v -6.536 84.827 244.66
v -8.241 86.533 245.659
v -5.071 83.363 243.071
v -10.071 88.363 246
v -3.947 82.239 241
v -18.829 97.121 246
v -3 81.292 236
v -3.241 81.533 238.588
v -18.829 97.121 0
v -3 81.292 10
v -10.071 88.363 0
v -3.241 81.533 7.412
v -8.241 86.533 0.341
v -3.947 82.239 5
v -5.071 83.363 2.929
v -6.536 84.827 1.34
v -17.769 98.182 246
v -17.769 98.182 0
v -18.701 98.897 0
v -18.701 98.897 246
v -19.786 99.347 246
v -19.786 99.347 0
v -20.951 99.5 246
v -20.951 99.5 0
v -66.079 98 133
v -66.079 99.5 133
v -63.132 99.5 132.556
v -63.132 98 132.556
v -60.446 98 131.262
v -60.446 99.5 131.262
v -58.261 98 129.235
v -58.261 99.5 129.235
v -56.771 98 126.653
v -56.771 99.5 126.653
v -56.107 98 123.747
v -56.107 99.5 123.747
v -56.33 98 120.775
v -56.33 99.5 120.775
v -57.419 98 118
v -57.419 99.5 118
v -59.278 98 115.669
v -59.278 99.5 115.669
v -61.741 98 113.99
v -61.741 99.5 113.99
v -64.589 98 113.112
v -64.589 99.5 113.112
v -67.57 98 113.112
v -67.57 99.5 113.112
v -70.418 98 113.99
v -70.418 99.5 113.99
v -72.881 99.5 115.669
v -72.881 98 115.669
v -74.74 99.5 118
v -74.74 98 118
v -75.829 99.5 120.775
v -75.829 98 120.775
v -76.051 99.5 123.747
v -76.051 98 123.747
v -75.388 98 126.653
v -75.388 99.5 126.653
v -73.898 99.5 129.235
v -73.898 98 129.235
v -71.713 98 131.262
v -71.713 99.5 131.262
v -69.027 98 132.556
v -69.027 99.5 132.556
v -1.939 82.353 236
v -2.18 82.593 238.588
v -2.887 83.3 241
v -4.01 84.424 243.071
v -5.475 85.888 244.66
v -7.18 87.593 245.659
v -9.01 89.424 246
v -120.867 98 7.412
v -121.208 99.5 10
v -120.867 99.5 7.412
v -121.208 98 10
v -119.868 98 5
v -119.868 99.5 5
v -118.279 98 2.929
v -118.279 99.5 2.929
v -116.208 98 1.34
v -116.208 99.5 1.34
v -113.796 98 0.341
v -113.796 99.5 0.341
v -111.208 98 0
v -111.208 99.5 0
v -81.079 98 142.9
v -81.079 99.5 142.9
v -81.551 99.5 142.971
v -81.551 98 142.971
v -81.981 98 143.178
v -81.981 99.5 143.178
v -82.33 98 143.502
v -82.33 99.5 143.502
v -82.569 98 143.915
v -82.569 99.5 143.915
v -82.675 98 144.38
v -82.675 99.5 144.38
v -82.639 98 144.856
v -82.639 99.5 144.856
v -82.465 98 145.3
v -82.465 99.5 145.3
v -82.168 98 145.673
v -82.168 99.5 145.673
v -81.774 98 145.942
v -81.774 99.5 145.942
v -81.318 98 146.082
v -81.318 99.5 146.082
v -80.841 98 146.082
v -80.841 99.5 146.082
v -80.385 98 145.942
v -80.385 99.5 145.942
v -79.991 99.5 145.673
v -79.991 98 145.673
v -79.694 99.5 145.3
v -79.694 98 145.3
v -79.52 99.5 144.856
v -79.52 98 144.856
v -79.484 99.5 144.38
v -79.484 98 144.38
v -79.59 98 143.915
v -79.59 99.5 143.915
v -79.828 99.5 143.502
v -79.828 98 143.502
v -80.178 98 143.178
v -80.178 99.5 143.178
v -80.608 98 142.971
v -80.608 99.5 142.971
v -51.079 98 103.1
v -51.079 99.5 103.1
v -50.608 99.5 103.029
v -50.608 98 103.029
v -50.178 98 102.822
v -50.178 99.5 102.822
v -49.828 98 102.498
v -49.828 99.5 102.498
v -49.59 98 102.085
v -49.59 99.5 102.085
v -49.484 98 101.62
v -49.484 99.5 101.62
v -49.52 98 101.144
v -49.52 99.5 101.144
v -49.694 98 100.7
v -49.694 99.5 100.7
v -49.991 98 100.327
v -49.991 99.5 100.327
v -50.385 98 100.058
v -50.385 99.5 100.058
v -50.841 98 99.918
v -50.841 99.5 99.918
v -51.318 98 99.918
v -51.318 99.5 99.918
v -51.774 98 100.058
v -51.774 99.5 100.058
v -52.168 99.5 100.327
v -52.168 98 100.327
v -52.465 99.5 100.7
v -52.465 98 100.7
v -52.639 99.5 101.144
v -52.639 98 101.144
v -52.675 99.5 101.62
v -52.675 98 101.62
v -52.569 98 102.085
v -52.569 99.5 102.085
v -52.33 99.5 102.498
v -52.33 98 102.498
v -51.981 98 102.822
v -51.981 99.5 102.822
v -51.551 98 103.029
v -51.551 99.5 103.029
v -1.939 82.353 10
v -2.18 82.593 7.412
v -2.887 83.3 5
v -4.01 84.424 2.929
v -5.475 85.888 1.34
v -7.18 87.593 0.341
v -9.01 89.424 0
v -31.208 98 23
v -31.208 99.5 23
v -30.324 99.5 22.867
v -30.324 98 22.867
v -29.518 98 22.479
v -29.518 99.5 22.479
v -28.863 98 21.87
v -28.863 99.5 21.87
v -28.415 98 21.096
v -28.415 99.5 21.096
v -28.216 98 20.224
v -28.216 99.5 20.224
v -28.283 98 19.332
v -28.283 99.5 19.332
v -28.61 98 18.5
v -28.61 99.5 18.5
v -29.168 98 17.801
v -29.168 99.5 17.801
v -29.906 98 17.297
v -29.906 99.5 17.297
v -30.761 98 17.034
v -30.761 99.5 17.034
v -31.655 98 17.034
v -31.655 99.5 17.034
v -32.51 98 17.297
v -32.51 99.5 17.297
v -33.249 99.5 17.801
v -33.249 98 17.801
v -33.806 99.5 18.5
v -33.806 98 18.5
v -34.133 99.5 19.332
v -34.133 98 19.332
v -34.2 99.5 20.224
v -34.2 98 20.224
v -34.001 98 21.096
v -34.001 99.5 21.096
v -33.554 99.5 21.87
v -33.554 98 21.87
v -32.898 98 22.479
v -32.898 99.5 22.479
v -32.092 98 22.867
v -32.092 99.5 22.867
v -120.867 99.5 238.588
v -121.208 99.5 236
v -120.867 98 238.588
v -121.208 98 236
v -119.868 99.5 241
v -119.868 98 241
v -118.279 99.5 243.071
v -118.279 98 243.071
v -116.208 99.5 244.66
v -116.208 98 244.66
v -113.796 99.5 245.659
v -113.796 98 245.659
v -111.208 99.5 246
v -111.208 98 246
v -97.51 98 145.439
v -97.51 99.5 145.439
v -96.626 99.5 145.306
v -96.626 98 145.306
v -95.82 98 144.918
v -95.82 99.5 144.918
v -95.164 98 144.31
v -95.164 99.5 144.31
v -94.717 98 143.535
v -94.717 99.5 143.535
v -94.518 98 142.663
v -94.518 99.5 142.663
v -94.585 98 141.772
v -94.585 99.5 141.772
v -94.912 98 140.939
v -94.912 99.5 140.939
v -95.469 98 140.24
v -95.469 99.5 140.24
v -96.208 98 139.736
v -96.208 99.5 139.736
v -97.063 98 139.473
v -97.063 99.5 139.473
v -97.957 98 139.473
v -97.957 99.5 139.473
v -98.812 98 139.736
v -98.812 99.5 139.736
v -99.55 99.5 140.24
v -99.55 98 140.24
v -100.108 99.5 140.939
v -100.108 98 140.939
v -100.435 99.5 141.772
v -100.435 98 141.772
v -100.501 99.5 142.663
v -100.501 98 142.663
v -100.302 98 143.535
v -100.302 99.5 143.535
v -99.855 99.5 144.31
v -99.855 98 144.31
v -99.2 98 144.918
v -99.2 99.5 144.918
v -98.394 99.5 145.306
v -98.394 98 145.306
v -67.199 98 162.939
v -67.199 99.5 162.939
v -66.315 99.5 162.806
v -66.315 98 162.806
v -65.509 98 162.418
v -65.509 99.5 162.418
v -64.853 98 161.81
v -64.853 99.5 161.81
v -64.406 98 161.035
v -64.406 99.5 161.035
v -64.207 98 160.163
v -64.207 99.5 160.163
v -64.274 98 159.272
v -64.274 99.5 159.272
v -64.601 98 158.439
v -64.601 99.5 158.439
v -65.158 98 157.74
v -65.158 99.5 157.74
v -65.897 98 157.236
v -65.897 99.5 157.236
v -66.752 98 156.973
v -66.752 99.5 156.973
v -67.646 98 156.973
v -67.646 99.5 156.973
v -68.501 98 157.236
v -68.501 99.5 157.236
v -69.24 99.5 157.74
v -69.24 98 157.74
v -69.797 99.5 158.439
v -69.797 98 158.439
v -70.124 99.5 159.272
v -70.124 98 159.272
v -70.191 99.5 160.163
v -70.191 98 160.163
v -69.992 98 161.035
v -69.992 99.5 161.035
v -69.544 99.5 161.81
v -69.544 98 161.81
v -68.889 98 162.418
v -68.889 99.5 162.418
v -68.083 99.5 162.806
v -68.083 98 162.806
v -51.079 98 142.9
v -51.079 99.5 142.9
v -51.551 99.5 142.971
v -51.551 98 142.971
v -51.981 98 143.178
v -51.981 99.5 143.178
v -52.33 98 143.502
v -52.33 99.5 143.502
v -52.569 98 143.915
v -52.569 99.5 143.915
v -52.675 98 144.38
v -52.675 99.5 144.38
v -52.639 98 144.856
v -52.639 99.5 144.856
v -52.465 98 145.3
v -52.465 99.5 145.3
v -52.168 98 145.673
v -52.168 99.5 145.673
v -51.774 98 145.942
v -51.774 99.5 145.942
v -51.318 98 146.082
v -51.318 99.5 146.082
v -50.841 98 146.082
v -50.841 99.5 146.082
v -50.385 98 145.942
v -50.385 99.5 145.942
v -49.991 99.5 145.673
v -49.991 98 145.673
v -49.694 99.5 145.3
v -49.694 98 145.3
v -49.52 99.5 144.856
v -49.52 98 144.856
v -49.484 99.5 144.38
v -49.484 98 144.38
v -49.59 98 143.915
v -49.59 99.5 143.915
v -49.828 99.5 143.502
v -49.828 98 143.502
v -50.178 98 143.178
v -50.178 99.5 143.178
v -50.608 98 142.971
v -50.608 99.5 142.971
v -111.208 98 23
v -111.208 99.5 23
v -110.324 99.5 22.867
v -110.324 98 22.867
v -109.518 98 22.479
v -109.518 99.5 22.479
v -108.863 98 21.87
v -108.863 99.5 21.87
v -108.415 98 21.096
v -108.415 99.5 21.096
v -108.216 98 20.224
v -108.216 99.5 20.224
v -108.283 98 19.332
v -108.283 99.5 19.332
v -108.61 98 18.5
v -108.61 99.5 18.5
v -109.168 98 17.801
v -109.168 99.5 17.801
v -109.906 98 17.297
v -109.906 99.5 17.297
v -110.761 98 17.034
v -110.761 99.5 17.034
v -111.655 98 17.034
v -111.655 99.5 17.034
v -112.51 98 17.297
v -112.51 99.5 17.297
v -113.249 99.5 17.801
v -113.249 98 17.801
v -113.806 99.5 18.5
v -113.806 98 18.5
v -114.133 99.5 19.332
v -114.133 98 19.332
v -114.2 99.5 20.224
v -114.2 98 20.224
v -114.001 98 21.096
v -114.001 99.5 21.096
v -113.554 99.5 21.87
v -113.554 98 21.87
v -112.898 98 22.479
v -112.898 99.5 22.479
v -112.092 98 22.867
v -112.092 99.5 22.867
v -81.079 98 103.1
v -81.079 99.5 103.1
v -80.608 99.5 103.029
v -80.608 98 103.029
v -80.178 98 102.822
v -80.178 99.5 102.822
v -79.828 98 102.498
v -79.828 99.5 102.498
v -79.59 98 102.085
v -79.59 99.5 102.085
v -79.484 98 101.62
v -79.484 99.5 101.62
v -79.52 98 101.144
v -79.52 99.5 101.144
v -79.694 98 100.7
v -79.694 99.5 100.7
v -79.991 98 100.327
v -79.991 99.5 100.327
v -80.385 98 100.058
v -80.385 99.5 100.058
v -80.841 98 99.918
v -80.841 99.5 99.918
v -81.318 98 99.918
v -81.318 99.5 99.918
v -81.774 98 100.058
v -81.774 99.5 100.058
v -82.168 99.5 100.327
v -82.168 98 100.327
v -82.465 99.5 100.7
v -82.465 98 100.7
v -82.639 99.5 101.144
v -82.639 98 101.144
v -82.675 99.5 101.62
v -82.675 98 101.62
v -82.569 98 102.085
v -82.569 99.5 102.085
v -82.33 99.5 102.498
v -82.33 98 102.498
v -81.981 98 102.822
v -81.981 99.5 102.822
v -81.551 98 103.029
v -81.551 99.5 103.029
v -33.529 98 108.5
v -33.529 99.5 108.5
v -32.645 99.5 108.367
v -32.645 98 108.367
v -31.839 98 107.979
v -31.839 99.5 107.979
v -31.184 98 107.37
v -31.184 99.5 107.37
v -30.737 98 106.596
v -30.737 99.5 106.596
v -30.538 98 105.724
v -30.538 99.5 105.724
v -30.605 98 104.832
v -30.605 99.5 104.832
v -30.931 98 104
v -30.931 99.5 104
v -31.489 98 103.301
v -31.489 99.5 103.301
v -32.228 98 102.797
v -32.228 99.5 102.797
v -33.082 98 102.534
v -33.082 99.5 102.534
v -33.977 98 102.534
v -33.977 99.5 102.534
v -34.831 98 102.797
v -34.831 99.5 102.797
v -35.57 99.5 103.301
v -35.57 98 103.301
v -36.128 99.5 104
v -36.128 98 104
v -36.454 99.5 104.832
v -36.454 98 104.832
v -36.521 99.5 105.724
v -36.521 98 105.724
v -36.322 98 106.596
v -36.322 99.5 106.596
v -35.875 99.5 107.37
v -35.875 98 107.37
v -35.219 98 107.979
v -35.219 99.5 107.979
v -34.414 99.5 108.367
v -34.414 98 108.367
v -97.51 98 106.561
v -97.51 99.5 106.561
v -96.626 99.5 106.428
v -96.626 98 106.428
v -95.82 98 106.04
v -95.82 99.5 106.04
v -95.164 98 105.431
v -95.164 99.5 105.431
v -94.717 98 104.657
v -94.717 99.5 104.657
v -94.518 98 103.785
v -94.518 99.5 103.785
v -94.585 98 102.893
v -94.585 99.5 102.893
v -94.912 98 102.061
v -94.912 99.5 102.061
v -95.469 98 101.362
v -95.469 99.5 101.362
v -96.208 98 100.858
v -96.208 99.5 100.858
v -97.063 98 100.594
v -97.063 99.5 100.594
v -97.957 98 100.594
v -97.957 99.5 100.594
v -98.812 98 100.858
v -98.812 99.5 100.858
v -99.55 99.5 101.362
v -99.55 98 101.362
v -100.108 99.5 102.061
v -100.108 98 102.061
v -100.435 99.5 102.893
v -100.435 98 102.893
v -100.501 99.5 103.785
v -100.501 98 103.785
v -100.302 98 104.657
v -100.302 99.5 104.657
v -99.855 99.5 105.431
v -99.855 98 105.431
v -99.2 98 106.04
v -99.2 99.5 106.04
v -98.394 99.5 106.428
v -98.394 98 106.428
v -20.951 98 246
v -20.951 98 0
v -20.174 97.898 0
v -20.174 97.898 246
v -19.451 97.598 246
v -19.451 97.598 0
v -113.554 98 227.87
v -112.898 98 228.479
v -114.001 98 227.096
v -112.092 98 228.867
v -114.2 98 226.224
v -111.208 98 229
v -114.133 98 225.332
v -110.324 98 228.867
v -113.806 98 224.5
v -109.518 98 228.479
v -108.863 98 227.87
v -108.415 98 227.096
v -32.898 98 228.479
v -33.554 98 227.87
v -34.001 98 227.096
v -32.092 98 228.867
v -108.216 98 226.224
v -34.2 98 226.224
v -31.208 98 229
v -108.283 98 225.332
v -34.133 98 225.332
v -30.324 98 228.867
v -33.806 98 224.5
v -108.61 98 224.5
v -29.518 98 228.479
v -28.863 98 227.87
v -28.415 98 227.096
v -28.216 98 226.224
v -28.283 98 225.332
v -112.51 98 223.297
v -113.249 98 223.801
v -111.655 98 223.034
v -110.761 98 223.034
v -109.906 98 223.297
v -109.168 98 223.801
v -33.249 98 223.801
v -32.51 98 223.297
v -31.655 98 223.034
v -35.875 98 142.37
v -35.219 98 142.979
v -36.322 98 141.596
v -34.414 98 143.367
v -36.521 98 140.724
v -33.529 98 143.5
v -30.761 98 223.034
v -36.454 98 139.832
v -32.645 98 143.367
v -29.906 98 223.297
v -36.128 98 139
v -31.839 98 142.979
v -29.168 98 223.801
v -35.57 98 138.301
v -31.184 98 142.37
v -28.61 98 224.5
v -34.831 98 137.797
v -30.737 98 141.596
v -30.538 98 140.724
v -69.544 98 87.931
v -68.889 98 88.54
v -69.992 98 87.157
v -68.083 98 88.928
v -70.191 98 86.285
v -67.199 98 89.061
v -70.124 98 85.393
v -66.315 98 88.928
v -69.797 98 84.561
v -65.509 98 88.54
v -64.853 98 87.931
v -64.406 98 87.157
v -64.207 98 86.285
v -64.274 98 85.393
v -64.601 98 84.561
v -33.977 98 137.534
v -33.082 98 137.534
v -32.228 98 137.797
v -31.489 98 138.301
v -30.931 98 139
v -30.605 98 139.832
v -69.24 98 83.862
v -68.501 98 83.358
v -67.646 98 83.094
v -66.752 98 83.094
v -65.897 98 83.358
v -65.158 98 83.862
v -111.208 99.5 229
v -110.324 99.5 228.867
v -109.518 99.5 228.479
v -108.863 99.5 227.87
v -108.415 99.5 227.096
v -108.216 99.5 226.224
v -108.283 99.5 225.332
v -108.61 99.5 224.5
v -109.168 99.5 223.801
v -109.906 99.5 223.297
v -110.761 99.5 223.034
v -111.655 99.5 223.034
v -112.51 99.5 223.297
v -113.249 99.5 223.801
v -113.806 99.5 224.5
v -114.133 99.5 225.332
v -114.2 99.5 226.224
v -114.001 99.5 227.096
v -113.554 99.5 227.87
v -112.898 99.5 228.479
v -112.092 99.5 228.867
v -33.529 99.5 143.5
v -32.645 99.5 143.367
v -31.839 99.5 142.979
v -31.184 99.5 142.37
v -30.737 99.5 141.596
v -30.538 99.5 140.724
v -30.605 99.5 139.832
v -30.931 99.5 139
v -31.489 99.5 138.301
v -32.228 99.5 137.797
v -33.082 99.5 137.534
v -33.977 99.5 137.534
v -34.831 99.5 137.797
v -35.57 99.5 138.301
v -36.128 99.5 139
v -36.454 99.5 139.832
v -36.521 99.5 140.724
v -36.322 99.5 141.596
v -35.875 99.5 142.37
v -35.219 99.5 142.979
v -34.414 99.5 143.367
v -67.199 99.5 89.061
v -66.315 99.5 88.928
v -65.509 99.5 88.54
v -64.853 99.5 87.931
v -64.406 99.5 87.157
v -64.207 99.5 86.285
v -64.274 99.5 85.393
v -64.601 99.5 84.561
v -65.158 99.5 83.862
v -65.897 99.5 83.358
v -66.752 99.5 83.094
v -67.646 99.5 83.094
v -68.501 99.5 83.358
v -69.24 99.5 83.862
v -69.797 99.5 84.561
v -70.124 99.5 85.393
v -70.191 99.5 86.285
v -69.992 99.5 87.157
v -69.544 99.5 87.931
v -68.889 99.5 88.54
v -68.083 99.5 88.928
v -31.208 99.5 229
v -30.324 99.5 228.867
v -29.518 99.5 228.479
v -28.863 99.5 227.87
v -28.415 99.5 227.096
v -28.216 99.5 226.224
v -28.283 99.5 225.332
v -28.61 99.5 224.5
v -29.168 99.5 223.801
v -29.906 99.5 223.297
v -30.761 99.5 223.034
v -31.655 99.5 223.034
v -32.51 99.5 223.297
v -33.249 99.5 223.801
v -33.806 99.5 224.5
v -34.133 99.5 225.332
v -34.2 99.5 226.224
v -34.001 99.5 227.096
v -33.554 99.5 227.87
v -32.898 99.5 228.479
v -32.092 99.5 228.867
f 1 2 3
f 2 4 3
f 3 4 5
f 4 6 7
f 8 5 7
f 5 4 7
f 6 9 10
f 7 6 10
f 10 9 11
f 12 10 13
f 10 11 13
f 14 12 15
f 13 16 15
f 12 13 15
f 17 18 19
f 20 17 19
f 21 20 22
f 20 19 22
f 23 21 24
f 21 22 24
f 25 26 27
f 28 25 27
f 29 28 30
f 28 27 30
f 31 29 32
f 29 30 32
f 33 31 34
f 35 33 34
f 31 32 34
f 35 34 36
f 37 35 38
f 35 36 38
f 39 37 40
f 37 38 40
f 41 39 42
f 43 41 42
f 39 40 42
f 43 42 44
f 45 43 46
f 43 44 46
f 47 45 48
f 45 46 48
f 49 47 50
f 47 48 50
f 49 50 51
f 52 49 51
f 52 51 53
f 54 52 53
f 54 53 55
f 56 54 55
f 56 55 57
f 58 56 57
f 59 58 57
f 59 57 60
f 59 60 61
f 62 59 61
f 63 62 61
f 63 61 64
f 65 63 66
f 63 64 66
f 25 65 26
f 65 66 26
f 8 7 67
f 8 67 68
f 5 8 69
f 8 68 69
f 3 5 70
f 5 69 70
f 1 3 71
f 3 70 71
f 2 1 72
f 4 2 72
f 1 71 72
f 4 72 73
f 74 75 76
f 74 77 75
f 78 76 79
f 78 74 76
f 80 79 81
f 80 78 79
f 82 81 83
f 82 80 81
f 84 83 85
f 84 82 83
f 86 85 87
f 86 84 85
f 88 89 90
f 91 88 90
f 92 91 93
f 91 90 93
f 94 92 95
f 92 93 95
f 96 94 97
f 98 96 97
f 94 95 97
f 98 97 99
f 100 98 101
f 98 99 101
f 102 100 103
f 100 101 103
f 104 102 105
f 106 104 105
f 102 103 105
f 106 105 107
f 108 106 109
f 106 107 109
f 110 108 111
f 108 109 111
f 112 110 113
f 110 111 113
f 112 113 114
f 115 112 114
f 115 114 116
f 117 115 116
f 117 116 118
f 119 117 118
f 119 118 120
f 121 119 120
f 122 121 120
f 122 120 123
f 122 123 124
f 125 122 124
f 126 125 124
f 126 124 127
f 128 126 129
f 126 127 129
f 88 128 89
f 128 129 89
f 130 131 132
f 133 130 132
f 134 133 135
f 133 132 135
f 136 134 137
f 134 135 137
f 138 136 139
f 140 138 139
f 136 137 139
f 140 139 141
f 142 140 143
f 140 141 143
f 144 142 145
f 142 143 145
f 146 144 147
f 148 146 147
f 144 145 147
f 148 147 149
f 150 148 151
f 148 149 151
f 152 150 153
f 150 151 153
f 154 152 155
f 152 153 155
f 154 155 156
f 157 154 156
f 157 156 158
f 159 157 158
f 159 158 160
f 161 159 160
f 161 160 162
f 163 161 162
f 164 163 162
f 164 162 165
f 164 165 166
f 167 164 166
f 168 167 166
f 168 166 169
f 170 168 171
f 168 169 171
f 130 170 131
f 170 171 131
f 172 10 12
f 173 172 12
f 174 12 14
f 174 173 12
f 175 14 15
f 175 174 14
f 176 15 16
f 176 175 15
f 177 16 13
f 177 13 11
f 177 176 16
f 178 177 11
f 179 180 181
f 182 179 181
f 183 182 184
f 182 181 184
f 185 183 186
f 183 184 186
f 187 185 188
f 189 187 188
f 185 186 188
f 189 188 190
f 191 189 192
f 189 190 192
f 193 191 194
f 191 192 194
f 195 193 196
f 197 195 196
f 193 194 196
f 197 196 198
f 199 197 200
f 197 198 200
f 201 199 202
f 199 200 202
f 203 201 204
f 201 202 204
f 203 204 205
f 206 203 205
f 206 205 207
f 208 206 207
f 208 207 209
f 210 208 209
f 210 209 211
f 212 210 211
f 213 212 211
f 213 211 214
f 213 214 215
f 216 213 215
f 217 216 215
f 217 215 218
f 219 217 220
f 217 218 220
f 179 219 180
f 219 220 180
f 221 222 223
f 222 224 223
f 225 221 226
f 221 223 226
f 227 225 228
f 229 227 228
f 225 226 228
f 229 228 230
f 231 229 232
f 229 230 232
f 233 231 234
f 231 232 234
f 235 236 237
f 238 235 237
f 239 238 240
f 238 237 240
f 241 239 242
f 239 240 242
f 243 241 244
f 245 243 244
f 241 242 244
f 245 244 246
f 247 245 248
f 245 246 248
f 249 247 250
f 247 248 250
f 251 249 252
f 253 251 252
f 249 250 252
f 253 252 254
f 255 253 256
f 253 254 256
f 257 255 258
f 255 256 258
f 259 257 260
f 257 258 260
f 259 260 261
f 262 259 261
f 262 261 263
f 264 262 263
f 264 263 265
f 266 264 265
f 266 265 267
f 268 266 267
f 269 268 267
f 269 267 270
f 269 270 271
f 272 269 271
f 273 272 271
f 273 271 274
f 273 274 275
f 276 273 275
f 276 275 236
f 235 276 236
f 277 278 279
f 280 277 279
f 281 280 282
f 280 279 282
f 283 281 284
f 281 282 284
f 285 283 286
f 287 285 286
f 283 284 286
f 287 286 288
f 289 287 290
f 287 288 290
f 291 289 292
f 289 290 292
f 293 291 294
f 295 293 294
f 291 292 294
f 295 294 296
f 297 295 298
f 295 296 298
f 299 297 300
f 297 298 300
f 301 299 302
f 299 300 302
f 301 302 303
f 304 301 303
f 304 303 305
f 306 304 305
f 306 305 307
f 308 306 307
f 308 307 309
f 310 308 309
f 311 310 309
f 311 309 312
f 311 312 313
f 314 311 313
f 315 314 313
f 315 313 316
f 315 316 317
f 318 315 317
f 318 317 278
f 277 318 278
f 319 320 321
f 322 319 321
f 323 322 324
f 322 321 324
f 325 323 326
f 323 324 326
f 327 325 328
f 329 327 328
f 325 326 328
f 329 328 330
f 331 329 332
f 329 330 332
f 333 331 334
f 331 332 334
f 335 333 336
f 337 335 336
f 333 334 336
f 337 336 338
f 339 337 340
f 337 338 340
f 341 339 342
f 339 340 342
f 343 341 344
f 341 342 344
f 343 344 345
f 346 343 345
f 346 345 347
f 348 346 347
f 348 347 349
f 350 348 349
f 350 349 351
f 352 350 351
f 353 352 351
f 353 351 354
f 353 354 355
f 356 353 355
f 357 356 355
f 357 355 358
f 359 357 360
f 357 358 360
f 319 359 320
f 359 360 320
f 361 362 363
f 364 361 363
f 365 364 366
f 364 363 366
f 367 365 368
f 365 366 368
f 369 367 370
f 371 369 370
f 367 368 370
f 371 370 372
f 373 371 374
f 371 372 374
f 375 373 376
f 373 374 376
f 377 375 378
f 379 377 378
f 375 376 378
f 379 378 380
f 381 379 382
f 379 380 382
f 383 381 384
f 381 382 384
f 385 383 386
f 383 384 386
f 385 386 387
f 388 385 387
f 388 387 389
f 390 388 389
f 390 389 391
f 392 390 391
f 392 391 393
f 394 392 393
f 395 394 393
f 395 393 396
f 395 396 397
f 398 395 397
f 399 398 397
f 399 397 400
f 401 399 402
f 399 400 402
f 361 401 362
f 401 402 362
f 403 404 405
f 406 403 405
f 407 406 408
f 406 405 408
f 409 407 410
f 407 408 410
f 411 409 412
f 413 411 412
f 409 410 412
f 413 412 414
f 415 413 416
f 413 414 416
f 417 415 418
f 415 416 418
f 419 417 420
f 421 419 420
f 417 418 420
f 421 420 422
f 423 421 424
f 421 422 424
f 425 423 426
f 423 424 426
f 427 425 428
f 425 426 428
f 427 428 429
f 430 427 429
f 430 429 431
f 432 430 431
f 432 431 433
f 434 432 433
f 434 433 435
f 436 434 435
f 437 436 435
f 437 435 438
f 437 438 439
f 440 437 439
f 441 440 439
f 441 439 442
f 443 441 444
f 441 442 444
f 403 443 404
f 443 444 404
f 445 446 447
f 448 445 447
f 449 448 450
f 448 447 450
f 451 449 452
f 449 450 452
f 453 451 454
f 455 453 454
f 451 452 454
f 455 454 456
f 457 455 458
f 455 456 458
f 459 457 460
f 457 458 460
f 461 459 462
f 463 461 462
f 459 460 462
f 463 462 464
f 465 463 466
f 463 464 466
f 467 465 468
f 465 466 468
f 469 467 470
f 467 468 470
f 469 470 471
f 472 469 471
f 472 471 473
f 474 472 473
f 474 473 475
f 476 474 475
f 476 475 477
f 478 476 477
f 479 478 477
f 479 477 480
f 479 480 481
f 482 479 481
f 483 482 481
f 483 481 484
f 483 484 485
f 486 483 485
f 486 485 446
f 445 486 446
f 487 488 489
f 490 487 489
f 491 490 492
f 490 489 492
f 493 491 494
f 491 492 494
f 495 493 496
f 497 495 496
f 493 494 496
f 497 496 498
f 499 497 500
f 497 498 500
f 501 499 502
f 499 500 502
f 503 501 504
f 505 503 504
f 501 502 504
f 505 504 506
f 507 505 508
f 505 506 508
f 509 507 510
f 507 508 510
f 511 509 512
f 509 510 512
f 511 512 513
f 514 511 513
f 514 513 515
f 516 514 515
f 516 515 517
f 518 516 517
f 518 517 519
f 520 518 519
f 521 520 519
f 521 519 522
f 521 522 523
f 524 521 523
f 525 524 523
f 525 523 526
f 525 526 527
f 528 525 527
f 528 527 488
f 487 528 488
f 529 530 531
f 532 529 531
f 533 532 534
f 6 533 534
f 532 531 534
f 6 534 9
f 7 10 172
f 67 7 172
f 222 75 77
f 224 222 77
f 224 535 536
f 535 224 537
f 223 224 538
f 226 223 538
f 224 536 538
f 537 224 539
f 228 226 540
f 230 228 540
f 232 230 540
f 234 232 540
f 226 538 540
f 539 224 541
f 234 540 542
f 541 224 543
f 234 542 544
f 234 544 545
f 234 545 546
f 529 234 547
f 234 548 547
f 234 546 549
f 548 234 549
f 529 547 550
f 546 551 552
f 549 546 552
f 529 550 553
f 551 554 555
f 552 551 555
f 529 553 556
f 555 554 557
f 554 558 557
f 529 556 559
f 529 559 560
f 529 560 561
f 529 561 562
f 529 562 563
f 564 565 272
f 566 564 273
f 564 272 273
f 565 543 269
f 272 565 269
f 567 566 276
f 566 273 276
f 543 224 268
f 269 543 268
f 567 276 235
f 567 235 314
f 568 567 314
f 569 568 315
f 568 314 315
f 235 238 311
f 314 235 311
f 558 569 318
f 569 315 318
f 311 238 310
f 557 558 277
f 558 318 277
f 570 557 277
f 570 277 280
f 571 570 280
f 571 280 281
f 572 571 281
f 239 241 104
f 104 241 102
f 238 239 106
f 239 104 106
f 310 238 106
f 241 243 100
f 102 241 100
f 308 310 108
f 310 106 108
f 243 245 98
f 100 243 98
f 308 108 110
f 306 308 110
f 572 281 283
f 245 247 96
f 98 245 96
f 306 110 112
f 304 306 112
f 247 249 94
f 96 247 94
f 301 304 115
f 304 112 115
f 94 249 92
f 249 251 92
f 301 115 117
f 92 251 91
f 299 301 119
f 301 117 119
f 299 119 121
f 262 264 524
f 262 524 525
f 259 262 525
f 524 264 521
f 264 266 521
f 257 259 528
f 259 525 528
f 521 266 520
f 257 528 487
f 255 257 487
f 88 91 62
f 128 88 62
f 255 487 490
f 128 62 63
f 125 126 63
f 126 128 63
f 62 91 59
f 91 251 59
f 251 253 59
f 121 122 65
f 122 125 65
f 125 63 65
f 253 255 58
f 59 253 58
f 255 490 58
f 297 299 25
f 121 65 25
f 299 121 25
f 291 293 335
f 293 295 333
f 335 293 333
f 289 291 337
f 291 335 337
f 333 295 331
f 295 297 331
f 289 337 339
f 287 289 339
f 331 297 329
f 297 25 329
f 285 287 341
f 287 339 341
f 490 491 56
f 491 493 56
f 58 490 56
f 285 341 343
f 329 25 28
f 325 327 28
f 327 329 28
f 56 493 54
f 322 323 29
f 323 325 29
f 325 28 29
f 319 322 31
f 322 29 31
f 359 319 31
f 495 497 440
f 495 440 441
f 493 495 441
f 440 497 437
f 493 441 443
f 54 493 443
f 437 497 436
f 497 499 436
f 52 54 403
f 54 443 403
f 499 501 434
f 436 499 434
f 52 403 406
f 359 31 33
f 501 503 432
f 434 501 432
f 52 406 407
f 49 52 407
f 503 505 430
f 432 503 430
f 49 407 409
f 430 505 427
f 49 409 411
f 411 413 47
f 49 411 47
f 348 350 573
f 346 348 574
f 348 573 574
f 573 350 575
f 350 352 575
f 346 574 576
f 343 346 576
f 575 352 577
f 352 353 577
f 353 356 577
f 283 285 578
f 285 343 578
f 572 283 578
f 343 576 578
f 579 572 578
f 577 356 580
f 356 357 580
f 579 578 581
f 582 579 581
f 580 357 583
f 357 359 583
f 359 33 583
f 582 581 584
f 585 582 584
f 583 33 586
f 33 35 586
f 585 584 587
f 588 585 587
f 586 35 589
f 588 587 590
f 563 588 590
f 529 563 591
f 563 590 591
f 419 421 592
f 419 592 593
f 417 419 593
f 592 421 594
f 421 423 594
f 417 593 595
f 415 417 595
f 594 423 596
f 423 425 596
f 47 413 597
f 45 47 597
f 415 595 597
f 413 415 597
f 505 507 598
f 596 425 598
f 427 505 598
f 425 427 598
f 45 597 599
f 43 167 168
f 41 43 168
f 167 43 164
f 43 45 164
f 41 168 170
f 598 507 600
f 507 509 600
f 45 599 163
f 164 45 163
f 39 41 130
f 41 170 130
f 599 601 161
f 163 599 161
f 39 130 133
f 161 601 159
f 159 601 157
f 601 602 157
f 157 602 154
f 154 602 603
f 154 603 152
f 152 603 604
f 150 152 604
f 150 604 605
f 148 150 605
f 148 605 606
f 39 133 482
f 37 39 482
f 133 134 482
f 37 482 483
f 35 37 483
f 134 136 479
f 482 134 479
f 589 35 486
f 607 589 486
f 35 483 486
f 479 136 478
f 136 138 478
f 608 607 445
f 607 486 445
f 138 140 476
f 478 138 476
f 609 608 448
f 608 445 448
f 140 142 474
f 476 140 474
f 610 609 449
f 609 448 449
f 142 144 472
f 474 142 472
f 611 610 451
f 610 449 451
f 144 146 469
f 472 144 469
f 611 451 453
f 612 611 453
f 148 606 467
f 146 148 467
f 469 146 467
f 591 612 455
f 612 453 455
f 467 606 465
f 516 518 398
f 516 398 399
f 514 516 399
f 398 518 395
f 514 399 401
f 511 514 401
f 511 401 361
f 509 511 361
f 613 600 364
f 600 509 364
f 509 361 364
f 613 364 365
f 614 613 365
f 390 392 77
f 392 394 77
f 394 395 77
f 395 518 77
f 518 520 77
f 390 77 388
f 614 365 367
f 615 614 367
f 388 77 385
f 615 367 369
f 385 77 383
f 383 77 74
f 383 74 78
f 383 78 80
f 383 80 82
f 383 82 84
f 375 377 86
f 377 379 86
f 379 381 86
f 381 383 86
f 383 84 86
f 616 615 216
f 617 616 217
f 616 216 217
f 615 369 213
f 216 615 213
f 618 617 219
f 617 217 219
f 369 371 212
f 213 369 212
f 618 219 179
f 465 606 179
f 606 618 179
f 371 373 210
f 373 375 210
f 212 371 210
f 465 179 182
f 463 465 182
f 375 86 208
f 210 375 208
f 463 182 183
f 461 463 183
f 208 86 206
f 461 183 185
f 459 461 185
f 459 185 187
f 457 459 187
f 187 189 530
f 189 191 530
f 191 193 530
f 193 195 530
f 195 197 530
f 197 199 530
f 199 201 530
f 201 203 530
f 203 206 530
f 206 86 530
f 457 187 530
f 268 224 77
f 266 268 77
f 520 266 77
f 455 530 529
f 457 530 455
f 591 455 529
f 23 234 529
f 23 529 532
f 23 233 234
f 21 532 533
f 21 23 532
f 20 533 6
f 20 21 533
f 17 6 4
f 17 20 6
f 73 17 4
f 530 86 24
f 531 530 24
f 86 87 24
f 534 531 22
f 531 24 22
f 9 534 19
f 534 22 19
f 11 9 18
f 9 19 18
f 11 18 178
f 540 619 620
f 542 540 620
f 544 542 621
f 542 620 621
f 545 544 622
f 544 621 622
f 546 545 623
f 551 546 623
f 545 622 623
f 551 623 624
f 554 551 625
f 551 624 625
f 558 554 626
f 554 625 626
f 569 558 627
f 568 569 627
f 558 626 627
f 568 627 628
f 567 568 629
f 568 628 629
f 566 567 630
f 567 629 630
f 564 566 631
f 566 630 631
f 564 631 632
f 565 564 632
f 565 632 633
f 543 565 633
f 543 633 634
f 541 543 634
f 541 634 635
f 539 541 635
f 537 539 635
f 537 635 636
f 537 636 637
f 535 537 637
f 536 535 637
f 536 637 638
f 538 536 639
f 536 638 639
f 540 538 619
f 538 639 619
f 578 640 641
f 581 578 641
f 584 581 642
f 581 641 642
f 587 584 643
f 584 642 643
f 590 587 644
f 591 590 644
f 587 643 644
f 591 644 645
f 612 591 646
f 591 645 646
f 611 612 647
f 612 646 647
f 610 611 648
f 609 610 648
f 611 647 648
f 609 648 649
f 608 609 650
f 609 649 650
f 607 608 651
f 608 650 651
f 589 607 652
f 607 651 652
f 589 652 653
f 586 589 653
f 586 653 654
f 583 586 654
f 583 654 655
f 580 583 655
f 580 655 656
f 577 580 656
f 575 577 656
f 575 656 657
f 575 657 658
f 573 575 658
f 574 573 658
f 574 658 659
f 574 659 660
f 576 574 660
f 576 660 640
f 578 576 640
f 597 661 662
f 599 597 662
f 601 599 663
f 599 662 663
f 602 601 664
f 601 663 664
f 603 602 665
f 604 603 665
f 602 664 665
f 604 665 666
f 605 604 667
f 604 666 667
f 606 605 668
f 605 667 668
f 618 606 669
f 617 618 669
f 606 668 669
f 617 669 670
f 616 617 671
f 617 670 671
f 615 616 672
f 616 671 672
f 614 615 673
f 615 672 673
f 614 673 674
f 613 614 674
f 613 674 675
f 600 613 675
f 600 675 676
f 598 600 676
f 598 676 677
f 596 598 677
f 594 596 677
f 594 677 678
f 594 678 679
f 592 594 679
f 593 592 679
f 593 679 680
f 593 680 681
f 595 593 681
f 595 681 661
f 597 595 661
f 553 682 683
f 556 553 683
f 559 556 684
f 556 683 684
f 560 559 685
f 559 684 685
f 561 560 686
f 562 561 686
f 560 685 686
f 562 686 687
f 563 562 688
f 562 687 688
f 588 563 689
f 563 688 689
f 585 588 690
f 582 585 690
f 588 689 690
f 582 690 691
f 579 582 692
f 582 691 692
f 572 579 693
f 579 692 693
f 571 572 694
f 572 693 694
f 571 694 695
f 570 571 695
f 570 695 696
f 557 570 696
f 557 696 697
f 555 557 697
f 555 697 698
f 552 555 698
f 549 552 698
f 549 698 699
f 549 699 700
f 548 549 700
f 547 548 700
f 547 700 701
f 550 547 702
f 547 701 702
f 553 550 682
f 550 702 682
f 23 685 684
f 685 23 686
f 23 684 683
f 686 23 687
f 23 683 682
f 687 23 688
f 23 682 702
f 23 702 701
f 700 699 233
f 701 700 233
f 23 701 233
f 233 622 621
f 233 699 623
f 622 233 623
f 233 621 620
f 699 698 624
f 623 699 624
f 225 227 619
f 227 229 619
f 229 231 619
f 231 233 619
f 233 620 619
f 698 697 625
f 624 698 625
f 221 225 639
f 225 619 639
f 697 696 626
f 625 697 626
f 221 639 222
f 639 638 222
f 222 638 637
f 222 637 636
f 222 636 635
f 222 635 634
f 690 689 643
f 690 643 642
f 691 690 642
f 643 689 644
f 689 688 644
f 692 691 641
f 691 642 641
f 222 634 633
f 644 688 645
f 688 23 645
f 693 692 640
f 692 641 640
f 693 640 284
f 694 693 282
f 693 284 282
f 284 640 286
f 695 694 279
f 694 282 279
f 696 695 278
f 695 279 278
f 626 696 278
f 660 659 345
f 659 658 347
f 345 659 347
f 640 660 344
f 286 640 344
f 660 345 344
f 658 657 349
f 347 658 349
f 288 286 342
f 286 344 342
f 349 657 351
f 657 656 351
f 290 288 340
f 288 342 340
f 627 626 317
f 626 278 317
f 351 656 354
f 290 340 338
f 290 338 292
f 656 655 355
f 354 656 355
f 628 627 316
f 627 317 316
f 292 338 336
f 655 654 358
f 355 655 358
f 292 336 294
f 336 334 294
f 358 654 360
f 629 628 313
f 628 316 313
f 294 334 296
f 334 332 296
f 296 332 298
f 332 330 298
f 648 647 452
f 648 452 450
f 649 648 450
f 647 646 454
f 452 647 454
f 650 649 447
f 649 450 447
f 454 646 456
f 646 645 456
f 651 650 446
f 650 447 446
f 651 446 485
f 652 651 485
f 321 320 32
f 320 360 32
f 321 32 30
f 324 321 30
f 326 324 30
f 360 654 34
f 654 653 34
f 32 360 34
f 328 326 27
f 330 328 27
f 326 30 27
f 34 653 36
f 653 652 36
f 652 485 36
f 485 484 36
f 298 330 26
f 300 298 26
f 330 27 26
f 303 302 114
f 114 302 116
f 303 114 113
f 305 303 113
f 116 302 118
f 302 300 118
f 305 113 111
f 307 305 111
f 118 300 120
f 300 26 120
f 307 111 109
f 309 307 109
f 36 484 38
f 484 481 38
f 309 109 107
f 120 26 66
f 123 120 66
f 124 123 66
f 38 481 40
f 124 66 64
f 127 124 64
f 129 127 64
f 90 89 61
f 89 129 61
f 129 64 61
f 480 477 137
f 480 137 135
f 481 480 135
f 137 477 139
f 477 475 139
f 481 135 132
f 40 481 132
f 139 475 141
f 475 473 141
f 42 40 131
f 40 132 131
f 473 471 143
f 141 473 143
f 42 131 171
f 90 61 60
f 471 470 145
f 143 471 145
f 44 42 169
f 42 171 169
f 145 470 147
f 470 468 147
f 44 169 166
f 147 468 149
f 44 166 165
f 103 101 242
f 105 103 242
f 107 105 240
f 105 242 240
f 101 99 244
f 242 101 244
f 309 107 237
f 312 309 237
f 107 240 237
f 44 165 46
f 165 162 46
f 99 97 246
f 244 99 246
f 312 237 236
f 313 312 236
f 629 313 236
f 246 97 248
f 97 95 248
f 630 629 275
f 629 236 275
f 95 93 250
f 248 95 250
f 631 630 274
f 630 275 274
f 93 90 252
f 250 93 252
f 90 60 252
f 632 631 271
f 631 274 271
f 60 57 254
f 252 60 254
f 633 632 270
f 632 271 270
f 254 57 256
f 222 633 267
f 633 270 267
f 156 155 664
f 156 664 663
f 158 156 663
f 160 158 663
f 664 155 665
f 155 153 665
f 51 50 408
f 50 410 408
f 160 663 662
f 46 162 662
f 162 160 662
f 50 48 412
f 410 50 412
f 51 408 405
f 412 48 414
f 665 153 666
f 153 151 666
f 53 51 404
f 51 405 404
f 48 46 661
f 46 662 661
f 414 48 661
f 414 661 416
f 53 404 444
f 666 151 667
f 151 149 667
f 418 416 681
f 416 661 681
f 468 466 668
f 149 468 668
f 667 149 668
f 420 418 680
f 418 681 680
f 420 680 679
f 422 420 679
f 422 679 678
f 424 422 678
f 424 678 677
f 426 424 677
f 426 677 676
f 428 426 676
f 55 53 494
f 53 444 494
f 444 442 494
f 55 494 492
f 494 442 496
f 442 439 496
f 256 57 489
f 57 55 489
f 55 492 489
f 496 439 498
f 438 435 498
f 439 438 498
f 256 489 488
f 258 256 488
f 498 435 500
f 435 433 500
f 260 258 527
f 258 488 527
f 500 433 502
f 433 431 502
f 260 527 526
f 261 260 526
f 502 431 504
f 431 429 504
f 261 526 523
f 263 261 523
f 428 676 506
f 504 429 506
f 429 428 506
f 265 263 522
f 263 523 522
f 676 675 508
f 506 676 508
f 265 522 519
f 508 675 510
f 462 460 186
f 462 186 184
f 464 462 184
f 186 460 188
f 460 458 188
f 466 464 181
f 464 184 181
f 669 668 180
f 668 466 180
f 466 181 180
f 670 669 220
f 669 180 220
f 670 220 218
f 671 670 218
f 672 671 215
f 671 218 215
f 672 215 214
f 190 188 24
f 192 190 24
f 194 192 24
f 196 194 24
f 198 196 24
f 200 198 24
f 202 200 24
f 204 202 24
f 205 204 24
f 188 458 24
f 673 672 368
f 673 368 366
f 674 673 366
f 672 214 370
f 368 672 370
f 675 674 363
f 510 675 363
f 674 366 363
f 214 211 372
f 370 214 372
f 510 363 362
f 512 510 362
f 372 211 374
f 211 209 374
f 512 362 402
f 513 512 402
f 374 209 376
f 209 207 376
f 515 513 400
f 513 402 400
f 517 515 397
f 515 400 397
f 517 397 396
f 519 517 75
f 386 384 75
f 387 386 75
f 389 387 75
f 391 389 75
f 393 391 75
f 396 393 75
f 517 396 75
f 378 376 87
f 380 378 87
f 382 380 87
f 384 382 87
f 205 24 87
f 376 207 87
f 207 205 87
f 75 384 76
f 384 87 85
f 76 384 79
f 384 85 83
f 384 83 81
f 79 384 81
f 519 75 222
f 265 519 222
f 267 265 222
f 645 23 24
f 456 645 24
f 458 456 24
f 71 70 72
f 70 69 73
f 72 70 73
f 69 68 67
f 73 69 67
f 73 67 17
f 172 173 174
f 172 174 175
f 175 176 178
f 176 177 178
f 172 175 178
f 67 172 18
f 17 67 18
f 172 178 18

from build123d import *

# Parameters (mm, degrees)
BASE_FLANGE1_DEPTH = 246
FILLET1_R          = 10
SKETCH7_R          = 3
CUT_EXTRUDE1_DEPTH = 1.5
SKETCH8_R          = 10
SKETCH8_R_2        = 1.6
CUT_EXTRUDE2_DEPTH = 1.5
SKETCH9_R          = 3
CUT_EXTRUDE3_DEPTH = 10


# Sheet-metal steps are written as plain solids
with BuildPart() as part:
    # Sketch1 → Base-Flange1 (new body)
    with BuildSketch(Plane.XY):
        with BuildLine():
            Line((-121.208107966, 98), (-20.950748653, 98))
            ThreePointArc((-20.950748653, 98), (-19.802698356, 97.771638598), (-18.829428309, 97.121320344))
            Line((-18.829428309, 97.121320344), (-3, 81.291892034))
            Line((-3, 81.291892034), (-1.939339828, 82.352552206))
            Line((-1.939339828, 82.352552206), (-17.768768137, 98.181980515))
            ThreePointArc((-17.768768137, 98.181980515), (-19.228673207, 99.157457896), (-20.950748653, 99.5))
            Line((-20.950748653, 99.5), (-121.208107966, 99.5))
            Line((-121.208107966, 99.5), (-121.208107966, 98))
        make_face()
    extrude(amount=BASE_FLANGE1_DEPTH)

    # Fillet1
    fillet1_edges = [part.edges().sort_by_distance(p)[0] for p in [
        (-121.208107966, 98.75, 246),
        (-121.208107966, 98.75, 0),
        (-2.469669914, 81.82222212, 246),
        (-2.469669914, 81.82222212, 0),
    ]]
    fillet(fillet1_edges, radius=FILLET1_R)

    # Sketch7 → Cut-Extrude1 (cut)
    with BuildSketch(Plane(origin=(0, 99.5, 0), x_dir=(1, 0, 0), z_dir=(0, 1, 0))):
        with Locations(Location((-111.208107966, -20, 0), (0, 0, 270))):
            Circle(SKETCH7_R)
        with Locations(Location((-31.208107966, -20, 0), (0, 0, 270))):
            Circle(SKETCH7_R)
        with Locations(Location((-31.208107966, -226, 0), (0, 0, 270))):
            Circle(SKETCH7_R)
        with Locations(Location((-111.208107966, -226, 0), (0, 0, 270))):
            Circle(SKETCH7_R)
    extrude(amount=-CUT_EXTRUDE1_DEPTH, mode=Mode.SUBTRACT)

    # Sketch8 → Cut-Extrude2 (cut)
    with BuildSketch(Plane(origin=(0, 99.5, 0), x_dir=(1, 0, 0), z_dir=(0, 1, 0))):
        with Locations(Location((-66.079428309, -123, 0), (0, 0, 270))):
            Circle(SKETCH8_R)
        with Locations(Location((-51.079428309, -101.5, 0), (0, 0, 270))):
            Circle(SKETCH8_R_2)
        with Locations(Location((-81.079428309, -101.5, 0), (0, 0, 270))):
            Circle(SKETCH8_R_2)
        with Locations(Location((-81.079428309, -144.5, 0), (0, 0, 90))):
            Circle(SKETCH8_R_2)
        with Locations(Location((-51.079428309, -144.5, 0), (0, 0, 90))):
            Circle(SKETCH8_R_2)
    extrude(amount=-CUT_EXTRUDE2_DEPTH, mode=Mode.SUBTRACT)

    # Sketch9 → Cut-Extrude3 (cut)
    with BuildSketch(Plane(origin=(0, 99.5, 0), x_dir=(1, 0, 0), z_dir=(0, 1, 0))):
        with Locations(Location((-33.529428309, -105.5, 0), (0, 0, 270))):
            Circle(SKETCH9_R)
        with Locations(Location((-33.529428309, -140.5, 0), (0, 0, 270))):
            Circle(SKETCH9_R)
        with Locations(Location((-67.198983743, -159.939126893, 0), (0, 0, 270))):
            Circle(SKETCH9_R)
        with Locations(Location((-97.509872875, -142.439126893, 0), (0, 0, 270))):
            Circle(SKETCH9_R)
        with Locations(Location((-97.509872875, -103.560873107, 0), (0, 0, 270))):
            Circle(SKETCH9_R)
        with Locations(Location((-67.198983743, -86.060873107, 0), (0, 0, 270))):
            Circle(SKETCH9_R)
    extrude(amount=-CUT_EXTRUDE3_DEPTH, mode=Mode.SUBTRACT)


solid = part.part
